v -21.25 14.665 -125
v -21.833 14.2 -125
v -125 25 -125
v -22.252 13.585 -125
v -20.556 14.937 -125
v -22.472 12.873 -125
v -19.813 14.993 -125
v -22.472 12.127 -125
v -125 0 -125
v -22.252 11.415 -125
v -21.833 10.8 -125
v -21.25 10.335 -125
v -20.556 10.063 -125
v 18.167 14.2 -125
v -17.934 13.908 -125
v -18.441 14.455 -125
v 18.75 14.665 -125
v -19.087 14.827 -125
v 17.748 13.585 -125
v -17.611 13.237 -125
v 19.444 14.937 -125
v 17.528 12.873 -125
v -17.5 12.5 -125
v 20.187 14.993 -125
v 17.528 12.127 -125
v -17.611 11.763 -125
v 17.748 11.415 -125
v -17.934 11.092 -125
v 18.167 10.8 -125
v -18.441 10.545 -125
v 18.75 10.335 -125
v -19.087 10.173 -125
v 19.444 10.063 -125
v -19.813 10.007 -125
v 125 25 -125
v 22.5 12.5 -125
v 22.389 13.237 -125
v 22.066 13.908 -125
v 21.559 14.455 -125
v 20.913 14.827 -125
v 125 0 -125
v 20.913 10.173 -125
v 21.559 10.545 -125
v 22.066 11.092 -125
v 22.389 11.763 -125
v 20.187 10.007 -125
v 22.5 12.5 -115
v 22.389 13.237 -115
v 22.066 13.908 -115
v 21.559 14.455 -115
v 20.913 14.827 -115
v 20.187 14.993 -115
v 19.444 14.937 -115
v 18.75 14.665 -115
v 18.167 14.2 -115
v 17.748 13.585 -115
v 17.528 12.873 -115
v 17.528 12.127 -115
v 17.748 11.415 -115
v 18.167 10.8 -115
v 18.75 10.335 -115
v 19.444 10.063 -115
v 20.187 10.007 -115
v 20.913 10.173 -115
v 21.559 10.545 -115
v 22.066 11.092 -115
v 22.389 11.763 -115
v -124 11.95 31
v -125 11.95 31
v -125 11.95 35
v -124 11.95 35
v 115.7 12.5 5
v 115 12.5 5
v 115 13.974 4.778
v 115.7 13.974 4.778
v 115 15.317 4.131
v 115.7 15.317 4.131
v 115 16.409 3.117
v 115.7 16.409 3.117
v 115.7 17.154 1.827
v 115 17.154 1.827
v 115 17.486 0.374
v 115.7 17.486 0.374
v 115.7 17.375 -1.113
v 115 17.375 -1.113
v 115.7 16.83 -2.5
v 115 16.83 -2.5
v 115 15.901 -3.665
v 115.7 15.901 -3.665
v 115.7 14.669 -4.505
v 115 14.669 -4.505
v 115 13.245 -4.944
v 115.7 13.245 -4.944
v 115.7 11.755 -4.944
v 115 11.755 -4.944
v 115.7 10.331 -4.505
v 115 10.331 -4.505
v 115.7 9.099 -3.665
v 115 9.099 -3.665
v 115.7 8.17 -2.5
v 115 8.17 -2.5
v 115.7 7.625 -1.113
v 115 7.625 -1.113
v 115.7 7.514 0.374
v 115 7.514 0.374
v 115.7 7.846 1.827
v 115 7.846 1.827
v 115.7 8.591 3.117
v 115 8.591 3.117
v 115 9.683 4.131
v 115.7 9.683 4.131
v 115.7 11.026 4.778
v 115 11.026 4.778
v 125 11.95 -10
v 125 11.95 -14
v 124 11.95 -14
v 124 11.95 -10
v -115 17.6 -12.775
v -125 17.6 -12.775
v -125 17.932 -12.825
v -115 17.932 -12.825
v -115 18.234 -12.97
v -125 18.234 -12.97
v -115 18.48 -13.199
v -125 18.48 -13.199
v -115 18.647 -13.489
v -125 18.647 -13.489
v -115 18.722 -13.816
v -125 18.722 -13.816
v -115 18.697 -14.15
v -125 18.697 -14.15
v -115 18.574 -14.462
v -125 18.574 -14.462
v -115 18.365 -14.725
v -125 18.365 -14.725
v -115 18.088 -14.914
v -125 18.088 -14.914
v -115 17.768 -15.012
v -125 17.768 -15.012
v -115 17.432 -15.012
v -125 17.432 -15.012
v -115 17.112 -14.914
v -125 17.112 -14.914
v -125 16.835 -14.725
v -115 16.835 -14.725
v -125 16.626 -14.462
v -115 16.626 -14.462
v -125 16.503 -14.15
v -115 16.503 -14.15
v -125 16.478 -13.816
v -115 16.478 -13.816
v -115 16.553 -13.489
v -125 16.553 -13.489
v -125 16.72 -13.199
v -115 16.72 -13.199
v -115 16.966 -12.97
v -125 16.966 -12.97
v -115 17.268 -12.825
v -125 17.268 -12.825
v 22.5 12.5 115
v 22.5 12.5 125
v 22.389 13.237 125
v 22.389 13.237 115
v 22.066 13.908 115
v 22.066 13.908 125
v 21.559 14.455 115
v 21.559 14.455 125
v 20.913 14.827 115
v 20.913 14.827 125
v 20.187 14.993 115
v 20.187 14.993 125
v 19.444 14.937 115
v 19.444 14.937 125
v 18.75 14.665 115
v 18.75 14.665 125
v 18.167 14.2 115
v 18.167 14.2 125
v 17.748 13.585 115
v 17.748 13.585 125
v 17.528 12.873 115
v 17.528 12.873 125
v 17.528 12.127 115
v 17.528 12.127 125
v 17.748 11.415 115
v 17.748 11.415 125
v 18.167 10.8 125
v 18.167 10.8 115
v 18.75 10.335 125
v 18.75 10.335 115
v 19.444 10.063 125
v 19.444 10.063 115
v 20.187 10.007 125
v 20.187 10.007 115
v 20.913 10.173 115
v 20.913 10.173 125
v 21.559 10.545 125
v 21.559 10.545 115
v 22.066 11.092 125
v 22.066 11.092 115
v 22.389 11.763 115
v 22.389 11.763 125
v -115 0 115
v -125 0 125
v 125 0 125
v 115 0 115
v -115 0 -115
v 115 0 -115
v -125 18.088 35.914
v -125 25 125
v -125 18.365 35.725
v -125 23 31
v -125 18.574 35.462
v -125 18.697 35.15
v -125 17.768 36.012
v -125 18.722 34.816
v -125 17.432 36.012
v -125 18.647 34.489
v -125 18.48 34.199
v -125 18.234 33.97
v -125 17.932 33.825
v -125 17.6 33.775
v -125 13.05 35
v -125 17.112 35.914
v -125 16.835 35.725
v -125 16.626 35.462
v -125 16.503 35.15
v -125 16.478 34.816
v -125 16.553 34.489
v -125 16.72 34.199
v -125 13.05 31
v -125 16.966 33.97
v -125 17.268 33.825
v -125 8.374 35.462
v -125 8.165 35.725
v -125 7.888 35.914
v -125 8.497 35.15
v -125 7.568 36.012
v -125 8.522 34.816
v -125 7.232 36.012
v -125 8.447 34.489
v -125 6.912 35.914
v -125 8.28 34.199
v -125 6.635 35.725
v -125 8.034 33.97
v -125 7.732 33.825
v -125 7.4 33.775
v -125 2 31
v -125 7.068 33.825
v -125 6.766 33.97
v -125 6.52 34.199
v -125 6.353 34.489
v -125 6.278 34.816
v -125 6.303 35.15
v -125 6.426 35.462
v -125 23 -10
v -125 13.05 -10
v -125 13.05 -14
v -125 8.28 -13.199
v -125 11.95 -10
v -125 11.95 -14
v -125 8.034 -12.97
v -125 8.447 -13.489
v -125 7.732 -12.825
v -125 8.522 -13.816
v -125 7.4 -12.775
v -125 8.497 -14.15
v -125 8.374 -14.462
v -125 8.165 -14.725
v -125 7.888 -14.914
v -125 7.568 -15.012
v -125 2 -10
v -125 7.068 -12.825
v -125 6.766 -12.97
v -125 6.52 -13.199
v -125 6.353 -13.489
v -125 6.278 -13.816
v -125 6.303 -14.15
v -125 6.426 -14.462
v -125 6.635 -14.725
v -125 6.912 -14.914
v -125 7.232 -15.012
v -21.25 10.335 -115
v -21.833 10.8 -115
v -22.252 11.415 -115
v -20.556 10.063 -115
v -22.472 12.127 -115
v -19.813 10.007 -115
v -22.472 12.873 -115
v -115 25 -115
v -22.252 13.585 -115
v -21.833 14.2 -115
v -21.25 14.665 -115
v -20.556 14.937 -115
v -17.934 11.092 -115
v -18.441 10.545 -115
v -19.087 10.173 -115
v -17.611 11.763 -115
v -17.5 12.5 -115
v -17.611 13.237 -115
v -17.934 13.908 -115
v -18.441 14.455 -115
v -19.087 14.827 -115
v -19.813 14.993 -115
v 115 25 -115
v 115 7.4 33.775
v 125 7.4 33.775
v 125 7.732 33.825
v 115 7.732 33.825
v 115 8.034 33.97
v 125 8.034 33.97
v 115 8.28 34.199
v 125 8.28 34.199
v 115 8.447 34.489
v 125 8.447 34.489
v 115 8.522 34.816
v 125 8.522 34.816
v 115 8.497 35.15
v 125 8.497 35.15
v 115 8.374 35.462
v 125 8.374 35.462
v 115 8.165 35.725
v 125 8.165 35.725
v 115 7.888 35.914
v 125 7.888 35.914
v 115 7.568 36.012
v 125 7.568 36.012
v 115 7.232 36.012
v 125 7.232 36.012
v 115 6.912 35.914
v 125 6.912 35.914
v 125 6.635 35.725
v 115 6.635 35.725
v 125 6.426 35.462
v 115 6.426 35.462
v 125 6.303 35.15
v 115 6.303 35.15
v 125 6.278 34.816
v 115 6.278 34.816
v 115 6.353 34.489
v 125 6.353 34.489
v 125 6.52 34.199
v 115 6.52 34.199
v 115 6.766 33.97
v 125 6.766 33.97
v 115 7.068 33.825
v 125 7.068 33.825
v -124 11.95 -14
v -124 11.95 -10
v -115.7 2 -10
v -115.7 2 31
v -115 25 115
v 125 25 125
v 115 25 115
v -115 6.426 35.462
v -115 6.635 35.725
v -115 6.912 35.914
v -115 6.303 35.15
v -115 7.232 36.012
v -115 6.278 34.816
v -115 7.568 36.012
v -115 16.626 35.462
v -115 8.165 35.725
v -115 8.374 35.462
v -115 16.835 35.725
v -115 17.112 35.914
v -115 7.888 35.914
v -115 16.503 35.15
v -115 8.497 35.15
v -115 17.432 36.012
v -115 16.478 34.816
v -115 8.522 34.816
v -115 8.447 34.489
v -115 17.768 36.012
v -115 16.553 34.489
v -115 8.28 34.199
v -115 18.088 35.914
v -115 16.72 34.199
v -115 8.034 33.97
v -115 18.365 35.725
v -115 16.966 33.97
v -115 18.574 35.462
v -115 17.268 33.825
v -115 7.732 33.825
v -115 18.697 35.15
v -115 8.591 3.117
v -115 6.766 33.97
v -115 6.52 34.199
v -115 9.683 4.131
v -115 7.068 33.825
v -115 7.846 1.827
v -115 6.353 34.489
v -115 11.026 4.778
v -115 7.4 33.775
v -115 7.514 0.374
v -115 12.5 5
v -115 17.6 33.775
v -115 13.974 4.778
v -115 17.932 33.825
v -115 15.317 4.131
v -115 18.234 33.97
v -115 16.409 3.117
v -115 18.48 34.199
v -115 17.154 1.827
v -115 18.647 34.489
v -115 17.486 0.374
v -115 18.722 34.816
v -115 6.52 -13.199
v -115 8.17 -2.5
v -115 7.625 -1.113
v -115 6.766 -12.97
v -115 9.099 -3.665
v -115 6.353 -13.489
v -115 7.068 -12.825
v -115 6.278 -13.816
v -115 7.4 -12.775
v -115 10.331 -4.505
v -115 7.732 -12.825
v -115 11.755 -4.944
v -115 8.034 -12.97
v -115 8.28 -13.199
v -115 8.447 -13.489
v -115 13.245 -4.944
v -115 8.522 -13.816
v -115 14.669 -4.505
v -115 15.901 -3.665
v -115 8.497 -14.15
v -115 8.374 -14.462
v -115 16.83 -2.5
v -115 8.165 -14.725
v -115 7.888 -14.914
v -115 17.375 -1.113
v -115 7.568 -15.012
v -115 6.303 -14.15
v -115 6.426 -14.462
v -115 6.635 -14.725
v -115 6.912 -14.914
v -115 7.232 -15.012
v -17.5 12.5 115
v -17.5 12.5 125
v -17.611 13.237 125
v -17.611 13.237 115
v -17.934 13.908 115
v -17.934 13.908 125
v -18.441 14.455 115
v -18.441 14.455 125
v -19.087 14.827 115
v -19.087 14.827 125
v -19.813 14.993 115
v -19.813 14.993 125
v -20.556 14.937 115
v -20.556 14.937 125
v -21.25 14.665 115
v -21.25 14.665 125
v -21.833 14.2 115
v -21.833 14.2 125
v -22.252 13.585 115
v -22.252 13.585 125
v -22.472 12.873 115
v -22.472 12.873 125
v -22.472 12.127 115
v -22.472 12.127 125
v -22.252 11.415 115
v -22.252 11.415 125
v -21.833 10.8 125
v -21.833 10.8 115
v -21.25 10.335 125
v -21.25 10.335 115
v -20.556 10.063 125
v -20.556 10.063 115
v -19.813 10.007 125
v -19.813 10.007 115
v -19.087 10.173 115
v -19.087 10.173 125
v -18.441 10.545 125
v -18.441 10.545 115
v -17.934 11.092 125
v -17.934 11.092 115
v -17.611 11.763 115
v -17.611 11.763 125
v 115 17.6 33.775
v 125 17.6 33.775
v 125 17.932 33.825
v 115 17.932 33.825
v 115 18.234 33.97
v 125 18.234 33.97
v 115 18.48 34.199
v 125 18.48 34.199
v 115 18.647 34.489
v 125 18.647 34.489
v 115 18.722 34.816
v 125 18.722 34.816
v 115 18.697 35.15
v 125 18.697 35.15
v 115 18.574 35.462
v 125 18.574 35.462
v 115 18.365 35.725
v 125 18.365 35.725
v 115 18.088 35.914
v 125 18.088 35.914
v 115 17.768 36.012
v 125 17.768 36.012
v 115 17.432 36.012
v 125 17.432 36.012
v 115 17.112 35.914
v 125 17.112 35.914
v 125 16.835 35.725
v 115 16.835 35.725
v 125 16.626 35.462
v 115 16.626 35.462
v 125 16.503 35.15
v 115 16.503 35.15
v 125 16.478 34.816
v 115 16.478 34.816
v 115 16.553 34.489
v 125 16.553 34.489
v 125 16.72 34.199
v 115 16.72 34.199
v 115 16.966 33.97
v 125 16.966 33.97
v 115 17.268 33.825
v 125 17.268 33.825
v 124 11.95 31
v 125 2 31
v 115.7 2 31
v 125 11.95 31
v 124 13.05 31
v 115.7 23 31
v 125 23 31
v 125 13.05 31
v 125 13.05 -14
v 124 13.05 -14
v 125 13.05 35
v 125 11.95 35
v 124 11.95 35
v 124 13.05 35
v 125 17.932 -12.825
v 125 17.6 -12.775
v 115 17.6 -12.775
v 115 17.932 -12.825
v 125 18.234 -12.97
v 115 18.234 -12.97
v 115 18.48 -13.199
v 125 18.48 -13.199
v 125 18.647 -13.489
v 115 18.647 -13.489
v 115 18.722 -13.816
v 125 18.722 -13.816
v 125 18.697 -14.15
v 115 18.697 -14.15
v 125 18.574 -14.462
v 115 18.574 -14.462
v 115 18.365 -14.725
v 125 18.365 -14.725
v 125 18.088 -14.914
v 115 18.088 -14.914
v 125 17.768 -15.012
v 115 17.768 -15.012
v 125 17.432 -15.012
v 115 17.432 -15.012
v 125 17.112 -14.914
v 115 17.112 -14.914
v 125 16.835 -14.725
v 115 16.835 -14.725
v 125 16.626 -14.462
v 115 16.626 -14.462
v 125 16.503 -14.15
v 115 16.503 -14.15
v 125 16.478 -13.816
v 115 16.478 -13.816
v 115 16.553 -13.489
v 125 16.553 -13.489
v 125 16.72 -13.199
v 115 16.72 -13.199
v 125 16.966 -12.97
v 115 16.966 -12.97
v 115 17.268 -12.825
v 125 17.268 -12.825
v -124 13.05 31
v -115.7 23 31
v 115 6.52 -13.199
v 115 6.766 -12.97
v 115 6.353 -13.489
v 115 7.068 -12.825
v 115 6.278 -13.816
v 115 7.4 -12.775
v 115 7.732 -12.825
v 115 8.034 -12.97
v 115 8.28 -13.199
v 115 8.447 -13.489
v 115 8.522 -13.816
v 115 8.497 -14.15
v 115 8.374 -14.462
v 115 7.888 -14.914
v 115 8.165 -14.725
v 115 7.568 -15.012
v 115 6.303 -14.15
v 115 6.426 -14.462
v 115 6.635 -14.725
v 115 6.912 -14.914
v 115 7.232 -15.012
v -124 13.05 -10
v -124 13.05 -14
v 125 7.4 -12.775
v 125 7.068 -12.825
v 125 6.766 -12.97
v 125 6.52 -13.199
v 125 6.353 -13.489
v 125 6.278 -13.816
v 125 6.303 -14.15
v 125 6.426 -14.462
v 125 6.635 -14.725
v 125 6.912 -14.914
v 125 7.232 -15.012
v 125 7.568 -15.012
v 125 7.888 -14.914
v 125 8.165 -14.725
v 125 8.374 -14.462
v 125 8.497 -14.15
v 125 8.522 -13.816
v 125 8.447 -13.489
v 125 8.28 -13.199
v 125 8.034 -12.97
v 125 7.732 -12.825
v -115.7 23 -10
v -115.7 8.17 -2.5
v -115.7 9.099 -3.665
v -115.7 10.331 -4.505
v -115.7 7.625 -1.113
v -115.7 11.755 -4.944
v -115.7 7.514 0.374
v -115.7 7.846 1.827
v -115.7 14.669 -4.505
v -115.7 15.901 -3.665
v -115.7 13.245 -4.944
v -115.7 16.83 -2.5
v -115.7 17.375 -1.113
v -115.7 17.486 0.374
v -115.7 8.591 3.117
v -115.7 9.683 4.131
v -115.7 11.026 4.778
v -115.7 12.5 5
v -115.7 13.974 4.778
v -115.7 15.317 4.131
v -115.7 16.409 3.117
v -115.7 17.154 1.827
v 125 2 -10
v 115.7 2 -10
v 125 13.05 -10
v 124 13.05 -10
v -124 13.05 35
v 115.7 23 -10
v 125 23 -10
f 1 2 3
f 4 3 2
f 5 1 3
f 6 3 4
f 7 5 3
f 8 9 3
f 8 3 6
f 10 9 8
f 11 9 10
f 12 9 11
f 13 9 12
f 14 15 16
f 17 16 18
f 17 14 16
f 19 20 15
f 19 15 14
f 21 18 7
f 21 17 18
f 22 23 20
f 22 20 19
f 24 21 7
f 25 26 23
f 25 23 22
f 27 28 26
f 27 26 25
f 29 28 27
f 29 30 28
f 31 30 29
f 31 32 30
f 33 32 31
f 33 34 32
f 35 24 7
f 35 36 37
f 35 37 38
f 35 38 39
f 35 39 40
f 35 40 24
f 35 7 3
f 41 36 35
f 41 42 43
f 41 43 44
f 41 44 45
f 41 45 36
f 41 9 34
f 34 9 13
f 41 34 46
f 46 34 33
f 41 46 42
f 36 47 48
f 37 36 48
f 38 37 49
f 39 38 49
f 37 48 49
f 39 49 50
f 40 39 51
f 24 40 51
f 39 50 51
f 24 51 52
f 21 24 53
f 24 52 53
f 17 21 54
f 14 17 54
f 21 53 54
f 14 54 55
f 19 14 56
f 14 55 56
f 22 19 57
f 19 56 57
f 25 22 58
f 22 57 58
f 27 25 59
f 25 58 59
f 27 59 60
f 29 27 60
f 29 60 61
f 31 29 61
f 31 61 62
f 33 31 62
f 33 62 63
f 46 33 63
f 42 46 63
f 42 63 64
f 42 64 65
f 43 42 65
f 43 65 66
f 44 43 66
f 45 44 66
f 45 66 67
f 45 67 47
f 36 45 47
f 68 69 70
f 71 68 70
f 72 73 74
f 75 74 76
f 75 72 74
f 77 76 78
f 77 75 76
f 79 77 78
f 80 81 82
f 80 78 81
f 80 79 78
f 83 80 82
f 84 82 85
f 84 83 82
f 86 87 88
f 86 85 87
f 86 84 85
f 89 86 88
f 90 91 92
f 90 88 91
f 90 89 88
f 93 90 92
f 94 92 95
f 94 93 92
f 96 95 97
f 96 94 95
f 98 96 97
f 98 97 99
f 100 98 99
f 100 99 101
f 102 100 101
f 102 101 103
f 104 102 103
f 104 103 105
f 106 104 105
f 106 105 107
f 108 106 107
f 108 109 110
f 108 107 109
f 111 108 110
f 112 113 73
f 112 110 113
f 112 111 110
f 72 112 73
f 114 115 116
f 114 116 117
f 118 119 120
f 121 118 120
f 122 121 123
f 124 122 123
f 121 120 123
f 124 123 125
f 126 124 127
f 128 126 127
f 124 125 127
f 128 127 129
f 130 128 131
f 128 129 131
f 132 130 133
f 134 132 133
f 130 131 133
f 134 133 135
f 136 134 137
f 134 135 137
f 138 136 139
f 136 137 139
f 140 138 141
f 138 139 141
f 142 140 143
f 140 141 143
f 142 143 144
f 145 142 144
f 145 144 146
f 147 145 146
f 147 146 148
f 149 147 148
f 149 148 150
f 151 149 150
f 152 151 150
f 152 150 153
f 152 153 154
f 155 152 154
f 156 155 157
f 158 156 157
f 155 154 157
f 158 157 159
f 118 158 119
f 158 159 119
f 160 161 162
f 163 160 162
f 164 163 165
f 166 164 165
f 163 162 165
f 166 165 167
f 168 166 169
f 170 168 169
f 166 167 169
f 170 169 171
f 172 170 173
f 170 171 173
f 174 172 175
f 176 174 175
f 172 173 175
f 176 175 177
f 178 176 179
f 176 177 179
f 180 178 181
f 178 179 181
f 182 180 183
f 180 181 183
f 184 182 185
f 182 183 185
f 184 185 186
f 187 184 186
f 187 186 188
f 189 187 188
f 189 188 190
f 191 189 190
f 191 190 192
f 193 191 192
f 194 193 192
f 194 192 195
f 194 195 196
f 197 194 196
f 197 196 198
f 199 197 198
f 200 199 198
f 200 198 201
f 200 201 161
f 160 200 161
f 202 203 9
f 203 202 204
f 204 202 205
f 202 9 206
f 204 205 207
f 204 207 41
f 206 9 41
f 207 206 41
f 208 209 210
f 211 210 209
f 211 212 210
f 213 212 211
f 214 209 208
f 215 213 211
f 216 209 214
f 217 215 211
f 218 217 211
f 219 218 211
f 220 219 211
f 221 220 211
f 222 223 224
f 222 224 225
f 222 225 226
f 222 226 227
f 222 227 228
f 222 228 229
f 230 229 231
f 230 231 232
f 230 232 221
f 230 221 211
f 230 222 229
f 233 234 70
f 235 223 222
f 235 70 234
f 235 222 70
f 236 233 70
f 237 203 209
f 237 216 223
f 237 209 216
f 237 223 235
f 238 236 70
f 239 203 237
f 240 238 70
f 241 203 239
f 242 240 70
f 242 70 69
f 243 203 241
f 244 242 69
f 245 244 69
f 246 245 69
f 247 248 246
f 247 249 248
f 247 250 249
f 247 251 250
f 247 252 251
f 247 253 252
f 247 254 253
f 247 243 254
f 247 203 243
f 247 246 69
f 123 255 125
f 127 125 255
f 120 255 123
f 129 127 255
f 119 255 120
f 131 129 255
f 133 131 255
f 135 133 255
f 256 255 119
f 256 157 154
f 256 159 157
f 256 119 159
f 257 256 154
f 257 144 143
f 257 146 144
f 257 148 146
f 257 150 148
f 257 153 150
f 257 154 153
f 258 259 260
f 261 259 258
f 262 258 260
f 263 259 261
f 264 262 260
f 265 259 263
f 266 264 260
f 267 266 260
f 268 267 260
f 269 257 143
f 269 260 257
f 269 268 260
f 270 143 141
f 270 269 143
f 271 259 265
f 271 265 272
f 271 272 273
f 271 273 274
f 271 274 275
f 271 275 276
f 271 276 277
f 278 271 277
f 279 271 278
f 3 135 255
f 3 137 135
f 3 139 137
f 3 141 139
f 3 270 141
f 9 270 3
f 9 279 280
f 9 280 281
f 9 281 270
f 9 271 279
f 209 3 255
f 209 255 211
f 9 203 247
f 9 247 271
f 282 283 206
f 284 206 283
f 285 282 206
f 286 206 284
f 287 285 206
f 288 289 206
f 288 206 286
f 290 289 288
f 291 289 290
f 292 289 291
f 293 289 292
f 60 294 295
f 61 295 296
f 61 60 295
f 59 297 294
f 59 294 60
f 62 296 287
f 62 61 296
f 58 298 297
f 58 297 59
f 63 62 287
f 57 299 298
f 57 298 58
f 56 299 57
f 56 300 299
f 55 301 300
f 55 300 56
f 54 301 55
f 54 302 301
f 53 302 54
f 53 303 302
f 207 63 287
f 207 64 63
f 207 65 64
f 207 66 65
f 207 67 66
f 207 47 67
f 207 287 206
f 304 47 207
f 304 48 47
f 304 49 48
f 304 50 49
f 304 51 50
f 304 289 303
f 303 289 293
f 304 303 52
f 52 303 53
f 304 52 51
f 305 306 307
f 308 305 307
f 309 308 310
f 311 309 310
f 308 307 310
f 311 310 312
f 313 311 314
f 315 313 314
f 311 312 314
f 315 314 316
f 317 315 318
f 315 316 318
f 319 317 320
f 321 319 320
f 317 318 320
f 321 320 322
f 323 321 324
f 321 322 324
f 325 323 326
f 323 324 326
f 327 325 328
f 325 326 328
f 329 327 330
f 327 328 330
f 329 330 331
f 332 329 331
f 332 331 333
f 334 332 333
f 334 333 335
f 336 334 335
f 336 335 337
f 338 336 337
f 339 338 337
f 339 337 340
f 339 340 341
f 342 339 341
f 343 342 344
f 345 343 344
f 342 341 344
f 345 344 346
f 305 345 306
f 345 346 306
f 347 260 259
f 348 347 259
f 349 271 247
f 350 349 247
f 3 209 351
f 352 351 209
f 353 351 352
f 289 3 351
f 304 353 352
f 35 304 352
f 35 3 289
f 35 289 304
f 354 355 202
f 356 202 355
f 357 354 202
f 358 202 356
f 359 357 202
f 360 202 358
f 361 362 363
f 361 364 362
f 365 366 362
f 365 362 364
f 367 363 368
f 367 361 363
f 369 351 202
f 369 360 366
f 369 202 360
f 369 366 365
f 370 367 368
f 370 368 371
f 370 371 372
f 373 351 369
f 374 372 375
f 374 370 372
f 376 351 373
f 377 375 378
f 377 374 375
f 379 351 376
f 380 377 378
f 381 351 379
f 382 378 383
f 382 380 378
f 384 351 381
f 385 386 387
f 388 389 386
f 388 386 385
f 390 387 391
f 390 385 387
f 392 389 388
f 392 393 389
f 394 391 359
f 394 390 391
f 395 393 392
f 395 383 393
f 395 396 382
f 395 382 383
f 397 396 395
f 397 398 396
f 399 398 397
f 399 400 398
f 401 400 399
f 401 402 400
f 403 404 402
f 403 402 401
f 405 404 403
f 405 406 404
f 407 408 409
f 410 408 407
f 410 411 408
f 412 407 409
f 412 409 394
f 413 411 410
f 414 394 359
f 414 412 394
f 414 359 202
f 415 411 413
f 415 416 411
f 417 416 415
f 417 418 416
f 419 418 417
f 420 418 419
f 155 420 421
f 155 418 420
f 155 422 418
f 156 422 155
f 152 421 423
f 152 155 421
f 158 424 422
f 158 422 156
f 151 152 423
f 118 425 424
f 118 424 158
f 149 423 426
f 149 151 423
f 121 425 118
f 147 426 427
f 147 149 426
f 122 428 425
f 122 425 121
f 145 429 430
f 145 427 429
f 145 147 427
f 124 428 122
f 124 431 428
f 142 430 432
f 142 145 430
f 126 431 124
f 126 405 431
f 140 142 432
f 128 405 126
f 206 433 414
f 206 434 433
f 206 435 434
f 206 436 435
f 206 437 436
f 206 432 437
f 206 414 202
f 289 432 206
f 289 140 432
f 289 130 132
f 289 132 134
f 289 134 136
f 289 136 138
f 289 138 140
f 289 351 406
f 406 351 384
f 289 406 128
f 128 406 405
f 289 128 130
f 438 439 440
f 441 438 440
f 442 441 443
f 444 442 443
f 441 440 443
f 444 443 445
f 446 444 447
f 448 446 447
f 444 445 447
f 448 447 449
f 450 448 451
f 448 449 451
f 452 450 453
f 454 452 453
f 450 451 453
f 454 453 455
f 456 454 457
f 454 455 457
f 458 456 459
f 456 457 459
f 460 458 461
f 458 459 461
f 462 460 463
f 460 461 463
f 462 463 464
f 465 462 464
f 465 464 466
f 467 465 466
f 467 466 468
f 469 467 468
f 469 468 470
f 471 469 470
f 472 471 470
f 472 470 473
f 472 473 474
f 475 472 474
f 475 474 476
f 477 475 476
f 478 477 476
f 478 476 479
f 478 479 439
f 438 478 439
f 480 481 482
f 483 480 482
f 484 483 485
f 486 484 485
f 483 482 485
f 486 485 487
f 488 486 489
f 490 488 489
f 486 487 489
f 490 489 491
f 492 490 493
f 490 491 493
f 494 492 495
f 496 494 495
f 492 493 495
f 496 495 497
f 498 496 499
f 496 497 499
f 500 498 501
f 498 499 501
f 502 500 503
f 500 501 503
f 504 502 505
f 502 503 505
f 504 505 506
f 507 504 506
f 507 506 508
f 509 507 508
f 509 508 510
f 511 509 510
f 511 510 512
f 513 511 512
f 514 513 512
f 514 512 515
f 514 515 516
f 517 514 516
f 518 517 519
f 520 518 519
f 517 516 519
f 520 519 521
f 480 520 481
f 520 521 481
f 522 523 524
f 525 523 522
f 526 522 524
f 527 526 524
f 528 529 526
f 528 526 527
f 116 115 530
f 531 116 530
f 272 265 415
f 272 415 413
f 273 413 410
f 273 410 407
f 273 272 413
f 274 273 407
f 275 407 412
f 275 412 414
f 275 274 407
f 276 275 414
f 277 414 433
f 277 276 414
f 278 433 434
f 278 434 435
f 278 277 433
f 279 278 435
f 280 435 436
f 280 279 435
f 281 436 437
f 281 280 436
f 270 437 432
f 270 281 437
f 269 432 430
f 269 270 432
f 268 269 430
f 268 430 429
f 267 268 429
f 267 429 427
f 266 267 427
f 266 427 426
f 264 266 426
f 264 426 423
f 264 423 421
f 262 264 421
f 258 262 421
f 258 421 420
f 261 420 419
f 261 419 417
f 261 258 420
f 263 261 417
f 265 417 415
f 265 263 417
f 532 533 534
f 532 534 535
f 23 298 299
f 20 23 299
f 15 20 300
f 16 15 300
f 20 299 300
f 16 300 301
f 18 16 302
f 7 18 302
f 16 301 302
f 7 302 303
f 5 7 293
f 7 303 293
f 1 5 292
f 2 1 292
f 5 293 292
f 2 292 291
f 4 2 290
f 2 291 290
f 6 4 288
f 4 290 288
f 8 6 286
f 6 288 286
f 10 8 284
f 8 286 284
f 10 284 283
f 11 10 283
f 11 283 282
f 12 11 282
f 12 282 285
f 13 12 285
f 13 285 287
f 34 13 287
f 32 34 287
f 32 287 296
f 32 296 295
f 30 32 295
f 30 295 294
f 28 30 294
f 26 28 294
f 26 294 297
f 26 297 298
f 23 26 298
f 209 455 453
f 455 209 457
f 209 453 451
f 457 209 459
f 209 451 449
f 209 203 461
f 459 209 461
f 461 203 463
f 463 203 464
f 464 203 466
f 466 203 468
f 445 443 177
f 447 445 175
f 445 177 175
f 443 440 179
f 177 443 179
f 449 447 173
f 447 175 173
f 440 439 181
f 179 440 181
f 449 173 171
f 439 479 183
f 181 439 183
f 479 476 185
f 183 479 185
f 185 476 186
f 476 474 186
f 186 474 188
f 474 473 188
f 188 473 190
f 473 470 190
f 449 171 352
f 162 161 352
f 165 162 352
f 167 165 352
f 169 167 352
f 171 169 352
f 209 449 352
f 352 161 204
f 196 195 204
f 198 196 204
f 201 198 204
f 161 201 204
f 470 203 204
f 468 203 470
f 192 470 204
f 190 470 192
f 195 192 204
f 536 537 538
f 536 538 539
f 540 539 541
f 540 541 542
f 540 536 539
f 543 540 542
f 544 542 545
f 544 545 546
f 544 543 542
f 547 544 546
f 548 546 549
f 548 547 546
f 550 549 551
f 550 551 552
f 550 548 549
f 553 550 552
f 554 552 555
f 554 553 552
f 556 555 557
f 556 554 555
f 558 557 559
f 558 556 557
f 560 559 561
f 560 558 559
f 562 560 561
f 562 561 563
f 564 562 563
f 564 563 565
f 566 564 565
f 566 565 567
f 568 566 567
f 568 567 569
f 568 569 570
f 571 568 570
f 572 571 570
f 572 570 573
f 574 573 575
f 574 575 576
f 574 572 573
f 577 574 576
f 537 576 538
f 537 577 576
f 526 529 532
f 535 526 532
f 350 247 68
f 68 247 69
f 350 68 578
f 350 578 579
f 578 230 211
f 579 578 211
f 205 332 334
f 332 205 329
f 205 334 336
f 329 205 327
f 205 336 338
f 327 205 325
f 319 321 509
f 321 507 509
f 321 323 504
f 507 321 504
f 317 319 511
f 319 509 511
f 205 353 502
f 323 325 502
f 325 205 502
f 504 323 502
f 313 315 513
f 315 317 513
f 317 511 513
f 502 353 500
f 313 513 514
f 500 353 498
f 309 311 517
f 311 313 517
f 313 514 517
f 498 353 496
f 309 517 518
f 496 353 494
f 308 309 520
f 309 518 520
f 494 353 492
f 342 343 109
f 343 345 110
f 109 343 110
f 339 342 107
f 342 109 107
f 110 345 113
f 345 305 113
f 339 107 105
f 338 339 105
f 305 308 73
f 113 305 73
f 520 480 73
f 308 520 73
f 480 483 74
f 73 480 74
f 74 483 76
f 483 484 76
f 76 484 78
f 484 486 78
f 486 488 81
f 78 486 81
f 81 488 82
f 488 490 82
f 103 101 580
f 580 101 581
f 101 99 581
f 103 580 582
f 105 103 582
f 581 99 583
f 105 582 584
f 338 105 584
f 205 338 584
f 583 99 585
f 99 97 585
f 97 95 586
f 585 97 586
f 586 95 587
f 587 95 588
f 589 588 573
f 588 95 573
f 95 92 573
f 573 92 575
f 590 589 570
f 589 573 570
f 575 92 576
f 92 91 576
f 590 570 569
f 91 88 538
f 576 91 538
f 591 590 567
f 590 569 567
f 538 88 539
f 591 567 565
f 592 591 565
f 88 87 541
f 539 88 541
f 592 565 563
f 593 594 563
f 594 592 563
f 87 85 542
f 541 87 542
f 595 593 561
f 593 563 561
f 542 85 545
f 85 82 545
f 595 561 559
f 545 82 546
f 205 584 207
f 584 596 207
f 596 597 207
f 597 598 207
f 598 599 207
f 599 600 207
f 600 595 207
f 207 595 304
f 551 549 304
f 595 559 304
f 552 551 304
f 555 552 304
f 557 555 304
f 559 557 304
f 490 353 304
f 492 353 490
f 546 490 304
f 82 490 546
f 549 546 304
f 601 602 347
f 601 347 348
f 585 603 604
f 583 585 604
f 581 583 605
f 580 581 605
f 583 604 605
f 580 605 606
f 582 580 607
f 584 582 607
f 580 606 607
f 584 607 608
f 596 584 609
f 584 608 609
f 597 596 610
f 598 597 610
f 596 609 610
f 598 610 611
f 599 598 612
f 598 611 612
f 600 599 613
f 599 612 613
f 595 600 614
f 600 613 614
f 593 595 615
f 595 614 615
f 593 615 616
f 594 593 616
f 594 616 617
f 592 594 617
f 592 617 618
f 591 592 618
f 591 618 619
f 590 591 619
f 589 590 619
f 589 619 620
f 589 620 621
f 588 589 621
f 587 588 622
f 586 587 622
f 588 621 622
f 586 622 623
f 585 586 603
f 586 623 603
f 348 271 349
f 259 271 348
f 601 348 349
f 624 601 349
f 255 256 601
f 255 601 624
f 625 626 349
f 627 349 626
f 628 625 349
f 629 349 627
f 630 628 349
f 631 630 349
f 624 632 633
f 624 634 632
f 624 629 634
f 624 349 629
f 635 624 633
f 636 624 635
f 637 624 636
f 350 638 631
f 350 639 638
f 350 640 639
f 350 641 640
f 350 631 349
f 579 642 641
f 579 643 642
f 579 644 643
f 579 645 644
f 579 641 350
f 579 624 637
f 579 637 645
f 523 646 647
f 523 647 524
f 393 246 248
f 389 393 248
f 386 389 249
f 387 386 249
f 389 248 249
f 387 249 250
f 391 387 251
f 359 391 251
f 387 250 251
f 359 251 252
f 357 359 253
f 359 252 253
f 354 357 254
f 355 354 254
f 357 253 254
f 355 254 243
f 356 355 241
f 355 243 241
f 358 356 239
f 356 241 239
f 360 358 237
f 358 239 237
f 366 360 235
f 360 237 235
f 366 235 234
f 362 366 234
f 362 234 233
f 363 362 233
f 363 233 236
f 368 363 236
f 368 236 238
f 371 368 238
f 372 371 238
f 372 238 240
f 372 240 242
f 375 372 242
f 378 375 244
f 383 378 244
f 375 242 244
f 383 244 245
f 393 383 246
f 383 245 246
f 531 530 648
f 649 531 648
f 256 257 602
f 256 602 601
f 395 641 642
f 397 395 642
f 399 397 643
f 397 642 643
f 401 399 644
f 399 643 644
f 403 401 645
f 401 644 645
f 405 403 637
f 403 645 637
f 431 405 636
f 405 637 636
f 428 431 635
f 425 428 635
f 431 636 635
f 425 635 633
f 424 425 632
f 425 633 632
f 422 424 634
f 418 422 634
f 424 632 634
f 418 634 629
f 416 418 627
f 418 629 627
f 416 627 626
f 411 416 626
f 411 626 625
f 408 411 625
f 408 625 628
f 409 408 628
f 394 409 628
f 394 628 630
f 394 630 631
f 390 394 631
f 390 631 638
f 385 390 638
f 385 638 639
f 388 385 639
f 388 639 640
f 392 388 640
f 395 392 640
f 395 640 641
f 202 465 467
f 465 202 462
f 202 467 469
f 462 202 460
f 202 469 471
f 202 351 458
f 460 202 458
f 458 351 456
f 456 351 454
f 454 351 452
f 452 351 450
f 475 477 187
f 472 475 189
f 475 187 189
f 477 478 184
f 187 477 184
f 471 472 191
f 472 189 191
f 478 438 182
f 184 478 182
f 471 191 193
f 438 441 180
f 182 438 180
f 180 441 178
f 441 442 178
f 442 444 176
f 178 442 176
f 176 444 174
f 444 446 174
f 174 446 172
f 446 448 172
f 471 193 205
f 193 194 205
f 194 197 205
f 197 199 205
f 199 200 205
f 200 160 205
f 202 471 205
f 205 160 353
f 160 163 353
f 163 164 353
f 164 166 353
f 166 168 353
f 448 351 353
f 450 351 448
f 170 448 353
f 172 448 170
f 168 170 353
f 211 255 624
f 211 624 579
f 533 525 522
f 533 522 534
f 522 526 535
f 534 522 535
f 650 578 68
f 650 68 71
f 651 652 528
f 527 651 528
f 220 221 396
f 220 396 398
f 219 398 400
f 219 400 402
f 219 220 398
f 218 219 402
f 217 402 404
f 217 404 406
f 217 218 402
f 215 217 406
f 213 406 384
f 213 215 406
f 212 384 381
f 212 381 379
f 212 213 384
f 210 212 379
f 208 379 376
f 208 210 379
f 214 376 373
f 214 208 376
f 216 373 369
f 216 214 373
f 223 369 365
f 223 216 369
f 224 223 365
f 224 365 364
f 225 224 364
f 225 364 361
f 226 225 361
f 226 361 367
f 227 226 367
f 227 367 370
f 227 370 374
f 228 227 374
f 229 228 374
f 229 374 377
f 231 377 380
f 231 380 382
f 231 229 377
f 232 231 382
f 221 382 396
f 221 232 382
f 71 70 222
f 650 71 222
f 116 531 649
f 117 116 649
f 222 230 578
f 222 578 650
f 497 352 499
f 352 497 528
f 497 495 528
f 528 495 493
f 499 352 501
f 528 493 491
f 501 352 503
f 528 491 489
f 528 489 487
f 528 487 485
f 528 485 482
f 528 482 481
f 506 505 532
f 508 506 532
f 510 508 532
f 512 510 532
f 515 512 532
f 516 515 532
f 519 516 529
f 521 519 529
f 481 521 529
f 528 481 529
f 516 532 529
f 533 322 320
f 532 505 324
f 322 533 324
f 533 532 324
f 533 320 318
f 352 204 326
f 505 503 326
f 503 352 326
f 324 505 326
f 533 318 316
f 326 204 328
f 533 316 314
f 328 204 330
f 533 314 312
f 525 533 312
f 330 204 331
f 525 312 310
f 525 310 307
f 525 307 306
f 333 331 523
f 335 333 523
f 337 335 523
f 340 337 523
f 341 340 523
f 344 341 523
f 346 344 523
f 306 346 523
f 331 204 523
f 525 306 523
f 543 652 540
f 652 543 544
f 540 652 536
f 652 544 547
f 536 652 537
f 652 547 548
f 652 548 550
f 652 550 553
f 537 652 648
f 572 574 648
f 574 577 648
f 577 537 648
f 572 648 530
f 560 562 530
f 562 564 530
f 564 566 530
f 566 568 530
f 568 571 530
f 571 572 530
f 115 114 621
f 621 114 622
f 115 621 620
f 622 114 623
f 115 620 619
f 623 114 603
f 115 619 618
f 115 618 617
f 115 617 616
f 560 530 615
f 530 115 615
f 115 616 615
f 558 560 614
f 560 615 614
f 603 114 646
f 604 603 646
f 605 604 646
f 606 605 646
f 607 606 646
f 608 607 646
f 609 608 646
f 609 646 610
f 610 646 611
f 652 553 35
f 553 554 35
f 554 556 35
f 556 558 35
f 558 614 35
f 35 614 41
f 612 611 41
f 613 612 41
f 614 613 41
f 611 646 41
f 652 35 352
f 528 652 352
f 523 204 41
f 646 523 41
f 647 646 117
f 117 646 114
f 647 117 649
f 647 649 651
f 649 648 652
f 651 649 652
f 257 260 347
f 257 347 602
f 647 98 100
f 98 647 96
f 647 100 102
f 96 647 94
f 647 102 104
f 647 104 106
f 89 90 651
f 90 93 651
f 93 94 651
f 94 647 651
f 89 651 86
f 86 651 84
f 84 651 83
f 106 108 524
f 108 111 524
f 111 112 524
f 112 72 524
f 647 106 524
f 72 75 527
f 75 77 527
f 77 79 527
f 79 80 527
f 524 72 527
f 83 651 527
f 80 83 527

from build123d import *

# Parameters (mm, degrees)
SKETCH1_W                                  = 250
SKETCH1_H                                  = 250
BOSS_EXTRUDE1_DEPTH                        = 25
SKETCH2_W                                  = 230
SKETCH2_H                                  = 230
CUT_EXTRUDE1_DEPTH                         = 25
SKETCH19_W                                 = 41
SKETCH19_H                                 = 21
CUT_EXTRUDE10_DEPTH                        = 9.3
SKETCH20_R                                 = 5
CUT_EXTRUDE11_DEPTH                        = 9.3
SKETCH23_W                                 = 49
SKETCH23_H                                 = 1.1
CUT_EXTRUDE14_DEPTH                        = 1
SKETCH21_R                                 = 1.125
CUT_EXTRUDE12_DEPTH                        = 10
MIRROR1_AT_THE_SECOND_PLANE_COPY_1_SKETC_R = 1.125
MIRROR1_AT_THE_SECOND_PLANE_COPY_1_DEPTH   = 10
MIRROR2_COPY_1_SKETCH_R                    = 1.125
MIRROR2_COPY_1_DEPTH                       = 10
MIRROR2_COPY_2_SKETCH_R                    = 1.125
MIRROR2_COPY_2_DEPTH                       = 10
MIRROR2_COPY_3_SKETCH_R                    = 1.125
MIRROR2_COPY_3_DEPTH                       = 10
SKETCH22_R                                 = 2.5
CUT_EXTRUDE13_DEPTH                        = 281.624304008


with BuildPart() as part:
    # Sketch1 → Boss-Extrude1 (new body)
    with BuildSketch(Plane(origin=(0, 0, 0), x_dir=(1, 0, 0), z_dir=(0, 1, 0))):
        Rectangle(SKETCH1_W, SKETCH1_H)
    extrude(amount=BOSS_EXTRUDE1_DEPTH)

    # Sketch2 → Cut-Extrude1 (cut)
    with BuildSketch(Plane(origin=(0, 25, 0), x_dir=(1, 0, 0), z_dir=(0, 1, 0))):
        Rectangle(SKETCH2_W, SKETCH2_H)
    extrude(amount=-CUT_EXTRUDE1_DEPTH, mode=Mode.SUBTRACT)

    # Sketch19 → Cut-Extrude10 (cut)
    with BuildSketch(Plane.ZY.offset(125)):
        with Locations((10.5, 12.5)):
            Rectangle(SKETCH19_W, SKETCH19_H)
    cut_extrude10 = extrude(amount=-CUT_EXTRUDE10_DEPTH, mode=Mode.SUBTRACT)

    # Sketch20 → Cut-Extrude11 (cut)
    with BuildSketch(Plane.ZY.offset(115.7)):
        with Locations((0, 12.5)):
            Circle(SKETCH20_R)
    cut_extrude11 = extrude(amount=-CUT_EXTRUDE11_DEPTH, mode=Mode.SUBTRACT)

    # Sketch23 → Cut-Extrude14 (cut)
    with BuildSketch(Plane.ZY.offset(125)):
        with Locations((10.5, 12.5)):
            Rectangle(SKETCH23_W, SKETCH23_H)
    cut_extrude14 = extrude(amount=-CUT_EXTRUDE14_DEPTH, mode=Mode.SUBTRACT)

    # Sketch21 → Cut-Extrude12 (cut)
    with BuildSketch(Plane.ZY.offset(125)):
        with Locations((-13.9, 17.6)):
            Circle(SKETCH21_R)
    cut_extrude12 = extrude(amount=-CUT_EXTRUDE12_DEPTH, mode=Mode.SUBTRACT)

    # Mirror1: Cut-Extrude12 across plane
    add(cut_extrude12.mirror(Plane.XY.offset(10.5)), mode=Mode.SUBTRACT)

    # Mirror1 at the second plane: Cut-Extrude12 across plane
    add(cut_extrude12.mirror(Plane.ZX.offset(12.5)), mode=Mode.SUBTRACT)

    # Mirror1 at the second plane copy 1 sketc → Mirror1 at the second plane copy 1 (cut)
    with BuildSketch(Plane(origin=(-125, 25, 21), x_dir=(0, 0, -1), z_dir=(-1, 0, 0))):
        with Locations((-13.9, 17.6)):
            Circle(MIRROR1_AT_THE_SECOND_PLANE_COPY_1_SKETC_R)
    extrude(amount=-MIRROR1_AT_THE_SECOND_PLANE_COPY_1_DEPTH, mode=Mode.SUBTRACT)

    # Mirror2: Cut-Extrude10, Cut-Extrude11, Cut-Extrude14, Cut-Extrude12 across plane
    add(cut_extrude10.mirror(Plane.ZY), mode=Mode.SUBTRACT)
    add(cut_extrude11.mirror(Plane.ZY), mode=Mode.SUBTRACT)
    add(cut_extrude14.mirror(Plane.ZY), mode=Mode.SUBTRACT)
    add(cut_extrude12.mirror(Plane.ZY), mode=Mode.SUBTRACT)

    # Mirror2 copy 1 sketch → Mirror2 copy 1 (cut)
    with BuildSketch(Plane(origin=(125, 0, 21), x_dir=(0, 0, -1), z_dir=(1, 0, 0))):
        with Locations((-13.9, 17.6)):
            Circle(MIRROR2_COPY_1_SKETCH_R)
    extrude(amount=-MIRROR2_COPY_1_DEPTH, mode=Mode.SUBTRACT)

    # Mirror2 copy 2 sketch → Mirror2 copy 2 (cut)
    with BuildSketch(Plane(origin=(125, 25, 0), x_dir=(0, 0, 1), z_dir=(1, 0, 0))):
        with Locations((-13.9, 17.6)):
            Circle(MIRROR2_COPY_2_SKETCH_R)
    extrude(amount=-MIRROR2_COPY_2_DEPTH, mode=Mode.SUBTRACT)

    # Mirror2 copy 3 sketch → Mirror2 copy 3 (cut)
    with BuildSketch(Plane(origin=(125, 25, 21), x_dir=(0, 0, -1), z_dir=(1, 0, 0))):
        with Locations((-13.9, -17.6)):
            Circle(MIRROR2_COPY_3_SKETCH_R)
    extrude(amount=-MIRROR2_COPY_3_DEPTH, mode=Mode.SUBTRACT)

    # Sketch22 → Cut-Extrude13 (cut, through all)
    with BuildSketch(Plane.XY.offset(125)):
        with Locations((-20, 12.5)):
            Circle(SKETCH22_R)
        with Locations((20, 12.5)):
            Circle(SKETCH22_R)
    extrude(amount=-CUT_EXTRUDE13_DEPTH, mode=Mode.SUBTRACT)


solid = part.part
